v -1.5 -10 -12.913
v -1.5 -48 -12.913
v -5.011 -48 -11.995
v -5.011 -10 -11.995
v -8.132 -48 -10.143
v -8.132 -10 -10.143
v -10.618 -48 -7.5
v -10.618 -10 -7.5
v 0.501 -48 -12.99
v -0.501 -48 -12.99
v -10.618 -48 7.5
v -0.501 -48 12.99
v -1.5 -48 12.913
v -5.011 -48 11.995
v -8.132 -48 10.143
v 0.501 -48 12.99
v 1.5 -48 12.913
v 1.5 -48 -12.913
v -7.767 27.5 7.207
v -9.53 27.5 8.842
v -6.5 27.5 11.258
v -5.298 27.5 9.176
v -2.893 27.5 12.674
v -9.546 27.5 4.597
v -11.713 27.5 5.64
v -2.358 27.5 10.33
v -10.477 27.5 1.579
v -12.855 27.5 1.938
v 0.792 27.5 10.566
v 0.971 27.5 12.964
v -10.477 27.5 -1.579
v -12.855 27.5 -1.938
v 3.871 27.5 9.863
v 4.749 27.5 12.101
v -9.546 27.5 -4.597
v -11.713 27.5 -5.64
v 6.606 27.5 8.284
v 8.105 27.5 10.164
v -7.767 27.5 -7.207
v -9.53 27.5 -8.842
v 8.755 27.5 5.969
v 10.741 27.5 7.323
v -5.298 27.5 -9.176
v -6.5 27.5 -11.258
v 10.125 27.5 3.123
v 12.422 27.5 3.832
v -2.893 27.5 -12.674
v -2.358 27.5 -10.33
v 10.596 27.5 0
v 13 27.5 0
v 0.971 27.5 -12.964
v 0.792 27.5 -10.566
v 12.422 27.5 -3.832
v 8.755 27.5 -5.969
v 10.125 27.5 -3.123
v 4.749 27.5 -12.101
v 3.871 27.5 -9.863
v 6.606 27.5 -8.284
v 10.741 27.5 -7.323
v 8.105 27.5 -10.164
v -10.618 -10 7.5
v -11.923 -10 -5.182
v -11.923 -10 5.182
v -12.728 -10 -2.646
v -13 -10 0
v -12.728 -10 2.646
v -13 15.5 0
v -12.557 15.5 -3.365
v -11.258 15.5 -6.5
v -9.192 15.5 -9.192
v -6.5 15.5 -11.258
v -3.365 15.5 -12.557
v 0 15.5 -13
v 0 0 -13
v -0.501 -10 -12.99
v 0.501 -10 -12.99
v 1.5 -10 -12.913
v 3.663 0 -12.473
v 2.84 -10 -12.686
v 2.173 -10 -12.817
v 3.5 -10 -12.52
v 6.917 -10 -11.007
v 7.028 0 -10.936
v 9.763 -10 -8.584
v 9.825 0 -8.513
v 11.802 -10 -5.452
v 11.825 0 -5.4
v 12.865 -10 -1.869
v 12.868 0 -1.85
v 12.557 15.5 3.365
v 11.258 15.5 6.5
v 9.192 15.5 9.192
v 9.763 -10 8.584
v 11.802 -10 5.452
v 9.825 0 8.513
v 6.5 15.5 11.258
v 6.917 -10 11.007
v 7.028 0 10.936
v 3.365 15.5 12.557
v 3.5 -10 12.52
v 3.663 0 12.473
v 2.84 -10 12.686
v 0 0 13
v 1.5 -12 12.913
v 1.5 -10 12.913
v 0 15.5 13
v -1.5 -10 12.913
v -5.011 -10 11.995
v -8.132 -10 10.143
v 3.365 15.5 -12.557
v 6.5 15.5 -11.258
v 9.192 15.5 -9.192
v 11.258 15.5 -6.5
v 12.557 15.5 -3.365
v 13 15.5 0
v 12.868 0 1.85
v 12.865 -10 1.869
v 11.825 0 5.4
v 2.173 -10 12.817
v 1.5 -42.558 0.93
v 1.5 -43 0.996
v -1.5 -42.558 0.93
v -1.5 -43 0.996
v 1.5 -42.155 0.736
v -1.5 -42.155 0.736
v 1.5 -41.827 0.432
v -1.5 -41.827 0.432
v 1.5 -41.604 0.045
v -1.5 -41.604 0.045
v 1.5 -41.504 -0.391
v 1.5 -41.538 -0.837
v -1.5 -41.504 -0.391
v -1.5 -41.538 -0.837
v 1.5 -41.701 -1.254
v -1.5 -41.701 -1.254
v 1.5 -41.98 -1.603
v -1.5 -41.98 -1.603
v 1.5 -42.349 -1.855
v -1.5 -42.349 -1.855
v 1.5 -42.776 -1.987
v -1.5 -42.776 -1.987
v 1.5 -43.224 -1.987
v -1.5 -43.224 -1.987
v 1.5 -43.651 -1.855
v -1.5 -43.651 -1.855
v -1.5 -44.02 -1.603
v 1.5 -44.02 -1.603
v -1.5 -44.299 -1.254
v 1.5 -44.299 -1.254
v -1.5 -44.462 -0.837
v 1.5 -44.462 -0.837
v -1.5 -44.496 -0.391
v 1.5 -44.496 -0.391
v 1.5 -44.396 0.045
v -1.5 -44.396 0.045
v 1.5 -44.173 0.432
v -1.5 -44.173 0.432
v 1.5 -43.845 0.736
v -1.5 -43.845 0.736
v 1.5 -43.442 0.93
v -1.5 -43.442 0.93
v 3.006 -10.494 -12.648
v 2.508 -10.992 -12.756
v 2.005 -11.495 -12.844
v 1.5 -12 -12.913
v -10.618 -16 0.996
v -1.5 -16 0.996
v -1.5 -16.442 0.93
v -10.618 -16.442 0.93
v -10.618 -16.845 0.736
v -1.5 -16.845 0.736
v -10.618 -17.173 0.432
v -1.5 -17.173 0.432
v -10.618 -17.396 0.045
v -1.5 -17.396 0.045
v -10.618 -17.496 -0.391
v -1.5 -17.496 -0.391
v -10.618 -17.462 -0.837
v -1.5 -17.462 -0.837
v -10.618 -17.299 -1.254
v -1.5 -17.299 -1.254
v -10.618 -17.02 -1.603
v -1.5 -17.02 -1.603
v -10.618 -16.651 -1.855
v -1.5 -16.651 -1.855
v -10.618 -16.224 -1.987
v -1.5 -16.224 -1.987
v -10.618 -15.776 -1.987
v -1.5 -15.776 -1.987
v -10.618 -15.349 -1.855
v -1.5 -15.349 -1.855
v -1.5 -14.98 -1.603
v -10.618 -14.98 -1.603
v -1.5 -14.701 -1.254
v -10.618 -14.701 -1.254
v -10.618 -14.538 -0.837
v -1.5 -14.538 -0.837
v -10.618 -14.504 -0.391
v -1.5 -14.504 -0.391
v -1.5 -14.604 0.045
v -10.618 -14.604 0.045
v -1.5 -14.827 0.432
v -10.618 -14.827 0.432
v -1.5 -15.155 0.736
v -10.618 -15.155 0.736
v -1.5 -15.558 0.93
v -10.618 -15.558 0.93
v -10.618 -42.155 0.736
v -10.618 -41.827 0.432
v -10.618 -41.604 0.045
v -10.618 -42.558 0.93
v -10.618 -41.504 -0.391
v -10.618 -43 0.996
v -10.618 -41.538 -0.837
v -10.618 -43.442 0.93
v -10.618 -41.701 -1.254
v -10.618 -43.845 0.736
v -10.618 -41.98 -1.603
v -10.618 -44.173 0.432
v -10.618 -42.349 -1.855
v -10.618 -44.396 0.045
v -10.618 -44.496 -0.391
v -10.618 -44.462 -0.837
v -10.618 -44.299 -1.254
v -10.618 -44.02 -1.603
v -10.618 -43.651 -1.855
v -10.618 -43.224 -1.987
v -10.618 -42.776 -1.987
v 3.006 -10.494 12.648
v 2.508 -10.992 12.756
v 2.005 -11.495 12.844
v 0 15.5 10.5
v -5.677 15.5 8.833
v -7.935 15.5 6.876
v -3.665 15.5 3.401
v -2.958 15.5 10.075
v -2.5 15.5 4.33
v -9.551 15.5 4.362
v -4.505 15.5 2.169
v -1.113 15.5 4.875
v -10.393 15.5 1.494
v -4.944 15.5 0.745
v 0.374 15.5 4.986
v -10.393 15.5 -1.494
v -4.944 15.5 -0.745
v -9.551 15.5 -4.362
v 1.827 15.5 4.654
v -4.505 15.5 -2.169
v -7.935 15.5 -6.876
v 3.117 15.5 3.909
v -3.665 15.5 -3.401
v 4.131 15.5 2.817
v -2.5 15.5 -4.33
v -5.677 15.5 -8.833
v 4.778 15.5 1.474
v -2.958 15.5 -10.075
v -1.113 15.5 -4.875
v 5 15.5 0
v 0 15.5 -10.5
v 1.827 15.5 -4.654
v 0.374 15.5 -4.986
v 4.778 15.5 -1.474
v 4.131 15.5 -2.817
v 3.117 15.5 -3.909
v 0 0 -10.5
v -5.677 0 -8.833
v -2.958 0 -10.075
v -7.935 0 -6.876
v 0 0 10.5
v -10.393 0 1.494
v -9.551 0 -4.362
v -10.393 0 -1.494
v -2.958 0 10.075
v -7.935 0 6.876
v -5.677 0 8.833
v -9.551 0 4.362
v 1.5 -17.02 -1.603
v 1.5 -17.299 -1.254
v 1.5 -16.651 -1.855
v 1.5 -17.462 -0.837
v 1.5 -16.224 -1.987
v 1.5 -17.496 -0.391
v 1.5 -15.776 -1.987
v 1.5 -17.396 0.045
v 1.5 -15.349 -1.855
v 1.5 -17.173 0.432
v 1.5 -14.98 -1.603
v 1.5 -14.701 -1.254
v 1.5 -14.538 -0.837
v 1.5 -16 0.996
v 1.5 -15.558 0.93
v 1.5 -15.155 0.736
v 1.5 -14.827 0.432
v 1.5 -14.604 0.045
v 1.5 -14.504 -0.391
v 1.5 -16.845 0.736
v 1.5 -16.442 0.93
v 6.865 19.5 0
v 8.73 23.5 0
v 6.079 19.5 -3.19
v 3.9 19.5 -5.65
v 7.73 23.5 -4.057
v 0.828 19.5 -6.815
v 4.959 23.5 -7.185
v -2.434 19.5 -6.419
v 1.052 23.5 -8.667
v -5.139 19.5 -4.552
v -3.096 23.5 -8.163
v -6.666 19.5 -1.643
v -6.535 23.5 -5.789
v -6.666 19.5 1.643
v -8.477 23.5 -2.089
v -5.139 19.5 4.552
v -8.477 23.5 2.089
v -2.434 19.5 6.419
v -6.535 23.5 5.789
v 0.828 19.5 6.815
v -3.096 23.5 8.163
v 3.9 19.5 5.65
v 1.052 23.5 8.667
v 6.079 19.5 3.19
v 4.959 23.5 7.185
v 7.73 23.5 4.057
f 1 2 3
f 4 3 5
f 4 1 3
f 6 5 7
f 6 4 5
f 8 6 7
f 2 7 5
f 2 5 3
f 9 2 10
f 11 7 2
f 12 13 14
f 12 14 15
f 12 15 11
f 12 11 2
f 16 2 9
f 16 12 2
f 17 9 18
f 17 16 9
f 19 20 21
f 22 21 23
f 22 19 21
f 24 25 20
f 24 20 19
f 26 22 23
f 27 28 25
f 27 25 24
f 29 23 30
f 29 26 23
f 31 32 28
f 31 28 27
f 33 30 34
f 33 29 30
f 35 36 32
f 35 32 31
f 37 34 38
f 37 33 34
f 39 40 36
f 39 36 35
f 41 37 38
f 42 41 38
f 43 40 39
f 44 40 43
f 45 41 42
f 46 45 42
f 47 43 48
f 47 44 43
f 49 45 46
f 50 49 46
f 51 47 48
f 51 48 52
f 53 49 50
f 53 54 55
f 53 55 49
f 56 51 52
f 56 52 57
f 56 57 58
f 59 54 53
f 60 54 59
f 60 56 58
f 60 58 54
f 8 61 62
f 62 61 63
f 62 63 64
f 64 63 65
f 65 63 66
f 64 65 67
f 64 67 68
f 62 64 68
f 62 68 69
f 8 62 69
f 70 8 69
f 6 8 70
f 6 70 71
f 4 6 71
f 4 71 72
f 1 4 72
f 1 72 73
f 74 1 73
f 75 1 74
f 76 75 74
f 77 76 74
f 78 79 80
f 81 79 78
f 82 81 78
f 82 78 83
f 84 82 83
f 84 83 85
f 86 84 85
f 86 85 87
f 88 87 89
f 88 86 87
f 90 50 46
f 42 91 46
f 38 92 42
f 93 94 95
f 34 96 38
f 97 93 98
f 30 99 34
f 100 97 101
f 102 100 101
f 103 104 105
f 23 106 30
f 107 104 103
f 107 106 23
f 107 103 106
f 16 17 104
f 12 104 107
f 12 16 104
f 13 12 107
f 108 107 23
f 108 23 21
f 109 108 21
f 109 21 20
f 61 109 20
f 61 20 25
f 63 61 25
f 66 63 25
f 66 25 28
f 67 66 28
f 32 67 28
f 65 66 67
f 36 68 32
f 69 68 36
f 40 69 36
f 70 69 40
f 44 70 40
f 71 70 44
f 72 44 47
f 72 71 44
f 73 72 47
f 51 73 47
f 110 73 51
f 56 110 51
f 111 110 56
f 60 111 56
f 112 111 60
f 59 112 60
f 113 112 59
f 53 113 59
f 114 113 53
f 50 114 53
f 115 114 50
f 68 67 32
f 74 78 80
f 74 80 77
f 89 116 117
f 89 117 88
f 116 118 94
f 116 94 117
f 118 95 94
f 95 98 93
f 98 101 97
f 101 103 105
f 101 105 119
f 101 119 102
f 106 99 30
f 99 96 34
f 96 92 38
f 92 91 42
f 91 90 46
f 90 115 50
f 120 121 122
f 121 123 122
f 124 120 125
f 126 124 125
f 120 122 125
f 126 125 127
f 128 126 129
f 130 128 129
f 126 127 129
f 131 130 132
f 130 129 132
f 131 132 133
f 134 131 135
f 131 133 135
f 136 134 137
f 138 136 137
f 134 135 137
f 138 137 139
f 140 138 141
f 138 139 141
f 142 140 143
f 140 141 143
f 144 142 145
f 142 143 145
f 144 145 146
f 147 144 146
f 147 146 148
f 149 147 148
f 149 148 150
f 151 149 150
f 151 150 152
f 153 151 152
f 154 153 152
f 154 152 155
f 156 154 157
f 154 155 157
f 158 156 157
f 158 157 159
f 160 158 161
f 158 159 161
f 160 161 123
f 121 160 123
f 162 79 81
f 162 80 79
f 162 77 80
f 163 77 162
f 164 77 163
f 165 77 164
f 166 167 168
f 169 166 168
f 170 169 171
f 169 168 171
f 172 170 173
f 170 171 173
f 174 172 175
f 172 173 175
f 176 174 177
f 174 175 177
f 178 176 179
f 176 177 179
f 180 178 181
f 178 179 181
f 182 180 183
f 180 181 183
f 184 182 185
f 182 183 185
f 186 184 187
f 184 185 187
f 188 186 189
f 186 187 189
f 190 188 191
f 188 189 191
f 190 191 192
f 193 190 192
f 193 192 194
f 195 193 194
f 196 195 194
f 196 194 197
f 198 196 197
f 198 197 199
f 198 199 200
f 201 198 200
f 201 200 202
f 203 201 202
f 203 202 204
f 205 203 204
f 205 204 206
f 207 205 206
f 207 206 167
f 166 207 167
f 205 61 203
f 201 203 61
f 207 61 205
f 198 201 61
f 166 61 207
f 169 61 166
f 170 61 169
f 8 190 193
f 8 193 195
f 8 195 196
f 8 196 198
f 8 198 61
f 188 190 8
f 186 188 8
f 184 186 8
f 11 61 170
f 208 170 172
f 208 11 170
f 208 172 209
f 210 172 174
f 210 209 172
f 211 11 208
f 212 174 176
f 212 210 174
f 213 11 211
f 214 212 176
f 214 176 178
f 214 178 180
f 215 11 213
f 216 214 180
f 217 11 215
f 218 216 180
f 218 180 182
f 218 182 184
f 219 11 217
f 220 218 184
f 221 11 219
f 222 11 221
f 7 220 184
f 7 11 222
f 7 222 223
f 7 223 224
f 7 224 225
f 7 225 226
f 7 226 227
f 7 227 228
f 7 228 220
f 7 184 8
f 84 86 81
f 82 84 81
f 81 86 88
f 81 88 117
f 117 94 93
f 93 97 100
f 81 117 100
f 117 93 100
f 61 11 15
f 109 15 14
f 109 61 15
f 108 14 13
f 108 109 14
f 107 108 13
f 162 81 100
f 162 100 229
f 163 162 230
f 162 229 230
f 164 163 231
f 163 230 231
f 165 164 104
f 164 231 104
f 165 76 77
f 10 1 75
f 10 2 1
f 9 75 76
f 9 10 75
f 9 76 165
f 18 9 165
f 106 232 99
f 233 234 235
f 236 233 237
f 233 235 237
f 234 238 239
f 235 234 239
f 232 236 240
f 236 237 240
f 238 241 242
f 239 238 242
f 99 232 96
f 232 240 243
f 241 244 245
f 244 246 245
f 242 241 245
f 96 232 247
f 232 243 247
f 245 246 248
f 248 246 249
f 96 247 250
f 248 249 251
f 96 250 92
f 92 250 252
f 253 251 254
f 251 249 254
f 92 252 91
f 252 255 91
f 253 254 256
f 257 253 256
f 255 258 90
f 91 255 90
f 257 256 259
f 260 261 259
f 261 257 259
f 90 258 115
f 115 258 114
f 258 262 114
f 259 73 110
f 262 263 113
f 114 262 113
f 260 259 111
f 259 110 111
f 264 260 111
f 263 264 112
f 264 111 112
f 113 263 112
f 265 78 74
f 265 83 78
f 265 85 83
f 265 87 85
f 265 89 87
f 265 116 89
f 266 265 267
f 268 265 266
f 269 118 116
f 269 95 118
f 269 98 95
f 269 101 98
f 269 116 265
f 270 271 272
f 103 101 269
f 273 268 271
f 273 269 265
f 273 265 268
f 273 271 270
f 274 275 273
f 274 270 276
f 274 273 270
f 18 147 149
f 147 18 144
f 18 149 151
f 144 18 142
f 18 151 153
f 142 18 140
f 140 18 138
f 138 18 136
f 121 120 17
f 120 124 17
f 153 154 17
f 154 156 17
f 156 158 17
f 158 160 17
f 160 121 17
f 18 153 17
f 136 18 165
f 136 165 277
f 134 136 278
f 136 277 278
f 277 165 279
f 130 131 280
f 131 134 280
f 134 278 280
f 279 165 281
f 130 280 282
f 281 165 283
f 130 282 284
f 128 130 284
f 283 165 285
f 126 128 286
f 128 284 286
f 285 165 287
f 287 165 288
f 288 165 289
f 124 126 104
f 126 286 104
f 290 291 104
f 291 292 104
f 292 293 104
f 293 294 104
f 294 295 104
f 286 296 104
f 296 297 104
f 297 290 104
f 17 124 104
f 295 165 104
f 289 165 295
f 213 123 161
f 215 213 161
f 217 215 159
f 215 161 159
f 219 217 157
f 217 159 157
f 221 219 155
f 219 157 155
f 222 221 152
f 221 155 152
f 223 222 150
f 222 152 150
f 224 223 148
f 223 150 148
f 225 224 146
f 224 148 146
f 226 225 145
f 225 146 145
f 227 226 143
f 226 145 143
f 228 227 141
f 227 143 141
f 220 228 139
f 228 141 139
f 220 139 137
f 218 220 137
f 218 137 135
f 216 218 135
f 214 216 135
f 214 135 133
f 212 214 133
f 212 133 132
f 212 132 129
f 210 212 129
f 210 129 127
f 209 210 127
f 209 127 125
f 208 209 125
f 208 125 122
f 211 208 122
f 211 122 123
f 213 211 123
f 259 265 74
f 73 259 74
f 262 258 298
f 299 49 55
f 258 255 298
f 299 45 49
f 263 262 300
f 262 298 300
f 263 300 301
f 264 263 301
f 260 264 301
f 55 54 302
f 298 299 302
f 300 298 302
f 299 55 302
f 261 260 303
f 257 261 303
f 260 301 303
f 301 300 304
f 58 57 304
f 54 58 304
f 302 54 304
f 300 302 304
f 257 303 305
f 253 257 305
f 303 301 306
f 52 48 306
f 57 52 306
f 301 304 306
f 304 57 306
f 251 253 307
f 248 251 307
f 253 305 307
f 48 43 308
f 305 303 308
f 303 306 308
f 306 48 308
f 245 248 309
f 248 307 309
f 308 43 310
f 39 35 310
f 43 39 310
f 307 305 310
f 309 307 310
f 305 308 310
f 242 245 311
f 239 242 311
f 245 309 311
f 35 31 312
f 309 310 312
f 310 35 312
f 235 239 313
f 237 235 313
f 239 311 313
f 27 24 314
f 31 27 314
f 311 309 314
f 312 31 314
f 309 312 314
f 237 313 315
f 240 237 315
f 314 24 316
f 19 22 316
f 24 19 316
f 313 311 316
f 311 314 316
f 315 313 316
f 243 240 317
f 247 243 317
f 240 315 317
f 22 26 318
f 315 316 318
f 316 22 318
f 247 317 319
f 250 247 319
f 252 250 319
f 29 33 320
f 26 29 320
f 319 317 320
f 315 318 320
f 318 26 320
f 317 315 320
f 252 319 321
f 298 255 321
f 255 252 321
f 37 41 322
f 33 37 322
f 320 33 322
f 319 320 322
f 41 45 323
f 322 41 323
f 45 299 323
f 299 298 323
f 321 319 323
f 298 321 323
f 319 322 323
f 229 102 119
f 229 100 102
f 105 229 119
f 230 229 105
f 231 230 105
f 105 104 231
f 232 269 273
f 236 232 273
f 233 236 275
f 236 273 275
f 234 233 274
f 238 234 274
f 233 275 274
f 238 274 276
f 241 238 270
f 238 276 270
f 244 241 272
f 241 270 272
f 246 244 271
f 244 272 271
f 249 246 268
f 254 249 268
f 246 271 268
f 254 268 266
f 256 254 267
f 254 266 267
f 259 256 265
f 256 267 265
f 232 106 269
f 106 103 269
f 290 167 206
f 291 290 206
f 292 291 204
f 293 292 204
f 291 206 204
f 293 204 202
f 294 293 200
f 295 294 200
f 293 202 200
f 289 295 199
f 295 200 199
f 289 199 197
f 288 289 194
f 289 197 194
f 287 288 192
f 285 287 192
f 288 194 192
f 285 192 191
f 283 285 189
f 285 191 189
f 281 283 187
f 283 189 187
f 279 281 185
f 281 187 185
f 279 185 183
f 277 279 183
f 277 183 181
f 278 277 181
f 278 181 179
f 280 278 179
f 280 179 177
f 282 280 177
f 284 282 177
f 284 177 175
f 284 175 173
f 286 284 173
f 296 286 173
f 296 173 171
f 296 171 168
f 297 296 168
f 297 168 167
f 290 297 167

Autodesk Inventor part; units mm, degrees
ref_plane "YZ Plane" through (0, 0, 0) normal (1, 0, 0) x (0, 1, 0)
ref_plane "XZ Plane" through (0, 0, 0) normal (0, 1, 0) x (-1, 0, 0)
ref_plane "XY Plane" through (0, 0, 0) normal (0, 0, 1) x (1, 0, 0)
sketch "Sketch1" plane through (0, 0, 0) normal (0, 1, 0) x (-1, 0, 0)
  circle A0 centre (0, 0) radius 13
  circle A1 centre (0, 0) radius 10.5
  line L0 (0, 13) -> (0, -13)
  point P0 (0, -10.5)
  point P1 (0, 10.5)
  dimension "d0" = 26
  dimension "d1" = 21
extrude "Extrusion1" add sketch "Sketch1" against normal blind 10
extrude "Extrusion2" add sketch "Sketch1" along normal blind 15.5 contours A0 L0 A1 picked at (12.058, 0.9643)
sketch "Sketch2" plane through (0, 15.5, 0) normal (0, 1, 0) x (1, 0, 0)
  circle A0 centre (0, 0) radius 13 projected
  circle A1 centre (0, 0) radius 10.5 projected
  circle A2 centre (0, 0) radius 5
  dimension "d6" = 10
extrude "Extrusion3" add sketch "Sketch2" along normal blind 12 contours A0 | A1
extrude "Extrusion4" cut sketch "Sketch2" along normal blind 15 draft 25 contours A2
sketch "Sketch3" plane through (0, -10, 0) normal (0, -1, 0) x (1, 0, 0)
  line L0 (0, 0) -> (-1.5, 0)
  line L1 (-1.5, 0) -> (-1.5, -12.9132)
  circle A0 centre (0, 0) radius 13 projected
  line L2 (-1.5, 0) -> (-1.5, 12.9132)
  line L3 (0, 0) -> (0, -0.2769)
  line L4 (1.5, 0) -> (1.5, -12.9132)
  line L5 (1.5, 0) -> (1.5, 12.9132)
  point P0 (1.5, -12.9132)
  point P1 (1.5, 12.9132)
  dimension "d11" = 1.5
extrude "Extrusion5" add sketch "Sketch3" along normal blind 38 contours L2 A0 L5 L4 L1
sketch "Sketch6" plane through (0, -10, 0) normal (0, -1, 0) x (1, 0, 0)
  line L0 (-1.5, -12.9132) -> (-1.5, 12.9132) projected
  arc A0 (-1.5, 12.9132) -> (-1.5, -12.9132) centre (0, 0) ccw projected
  arc A1 (1.5, -12.9132) -> (1.5, 12.9132) centre (0, 0) ccw projected
  line L1 (1.5, -12.9132) -> (1.5, 12.9132) projected
extrude "Extrusion7" add sketch "Sketch6" along normal blind 38 contours A0 L0
sketch "Sketch4" plane through (-1.5, -10, -12.9132) normal (-1, 0, 0) x (0, 0, 1)
  circle A0 centre (12.4097, -33) radius 1.5
  line L0 (25.8263, -38) -> (0, -38) projected
  circle A1 centre (12.4097, -6) radius 1.5
  point P0 (12.9132, 10)
  dimension "d14" = 5
  dimension "d17" = 3
  dimension "d18" = 3
  dimension "d19" = 27
extrude "Extrusion6" cut sketch "Sketch4" along normal mid plane 30
chamfer "Chamfer1" distance 2 angle 45 1 edges at (1.5, -10, -6.4566)
sketch "Sketch7" plane through (0, -48, 0) normal (0, -1, 0) x (1, 0, 0)
  circle A0 centre (0, 0) radius 13 projected
  line L0 (-10.6184, 7.5) -> (-10.6184, -7.5)
  dimension "d25" = 15
extrude "Extrusion8" cut sketch "Sketch7" against normal blind 38 contours L0 A0 picked at (-11.1206, 1.5629)
properties part number "Tapered guide" material "PC/ABS Plastic"
